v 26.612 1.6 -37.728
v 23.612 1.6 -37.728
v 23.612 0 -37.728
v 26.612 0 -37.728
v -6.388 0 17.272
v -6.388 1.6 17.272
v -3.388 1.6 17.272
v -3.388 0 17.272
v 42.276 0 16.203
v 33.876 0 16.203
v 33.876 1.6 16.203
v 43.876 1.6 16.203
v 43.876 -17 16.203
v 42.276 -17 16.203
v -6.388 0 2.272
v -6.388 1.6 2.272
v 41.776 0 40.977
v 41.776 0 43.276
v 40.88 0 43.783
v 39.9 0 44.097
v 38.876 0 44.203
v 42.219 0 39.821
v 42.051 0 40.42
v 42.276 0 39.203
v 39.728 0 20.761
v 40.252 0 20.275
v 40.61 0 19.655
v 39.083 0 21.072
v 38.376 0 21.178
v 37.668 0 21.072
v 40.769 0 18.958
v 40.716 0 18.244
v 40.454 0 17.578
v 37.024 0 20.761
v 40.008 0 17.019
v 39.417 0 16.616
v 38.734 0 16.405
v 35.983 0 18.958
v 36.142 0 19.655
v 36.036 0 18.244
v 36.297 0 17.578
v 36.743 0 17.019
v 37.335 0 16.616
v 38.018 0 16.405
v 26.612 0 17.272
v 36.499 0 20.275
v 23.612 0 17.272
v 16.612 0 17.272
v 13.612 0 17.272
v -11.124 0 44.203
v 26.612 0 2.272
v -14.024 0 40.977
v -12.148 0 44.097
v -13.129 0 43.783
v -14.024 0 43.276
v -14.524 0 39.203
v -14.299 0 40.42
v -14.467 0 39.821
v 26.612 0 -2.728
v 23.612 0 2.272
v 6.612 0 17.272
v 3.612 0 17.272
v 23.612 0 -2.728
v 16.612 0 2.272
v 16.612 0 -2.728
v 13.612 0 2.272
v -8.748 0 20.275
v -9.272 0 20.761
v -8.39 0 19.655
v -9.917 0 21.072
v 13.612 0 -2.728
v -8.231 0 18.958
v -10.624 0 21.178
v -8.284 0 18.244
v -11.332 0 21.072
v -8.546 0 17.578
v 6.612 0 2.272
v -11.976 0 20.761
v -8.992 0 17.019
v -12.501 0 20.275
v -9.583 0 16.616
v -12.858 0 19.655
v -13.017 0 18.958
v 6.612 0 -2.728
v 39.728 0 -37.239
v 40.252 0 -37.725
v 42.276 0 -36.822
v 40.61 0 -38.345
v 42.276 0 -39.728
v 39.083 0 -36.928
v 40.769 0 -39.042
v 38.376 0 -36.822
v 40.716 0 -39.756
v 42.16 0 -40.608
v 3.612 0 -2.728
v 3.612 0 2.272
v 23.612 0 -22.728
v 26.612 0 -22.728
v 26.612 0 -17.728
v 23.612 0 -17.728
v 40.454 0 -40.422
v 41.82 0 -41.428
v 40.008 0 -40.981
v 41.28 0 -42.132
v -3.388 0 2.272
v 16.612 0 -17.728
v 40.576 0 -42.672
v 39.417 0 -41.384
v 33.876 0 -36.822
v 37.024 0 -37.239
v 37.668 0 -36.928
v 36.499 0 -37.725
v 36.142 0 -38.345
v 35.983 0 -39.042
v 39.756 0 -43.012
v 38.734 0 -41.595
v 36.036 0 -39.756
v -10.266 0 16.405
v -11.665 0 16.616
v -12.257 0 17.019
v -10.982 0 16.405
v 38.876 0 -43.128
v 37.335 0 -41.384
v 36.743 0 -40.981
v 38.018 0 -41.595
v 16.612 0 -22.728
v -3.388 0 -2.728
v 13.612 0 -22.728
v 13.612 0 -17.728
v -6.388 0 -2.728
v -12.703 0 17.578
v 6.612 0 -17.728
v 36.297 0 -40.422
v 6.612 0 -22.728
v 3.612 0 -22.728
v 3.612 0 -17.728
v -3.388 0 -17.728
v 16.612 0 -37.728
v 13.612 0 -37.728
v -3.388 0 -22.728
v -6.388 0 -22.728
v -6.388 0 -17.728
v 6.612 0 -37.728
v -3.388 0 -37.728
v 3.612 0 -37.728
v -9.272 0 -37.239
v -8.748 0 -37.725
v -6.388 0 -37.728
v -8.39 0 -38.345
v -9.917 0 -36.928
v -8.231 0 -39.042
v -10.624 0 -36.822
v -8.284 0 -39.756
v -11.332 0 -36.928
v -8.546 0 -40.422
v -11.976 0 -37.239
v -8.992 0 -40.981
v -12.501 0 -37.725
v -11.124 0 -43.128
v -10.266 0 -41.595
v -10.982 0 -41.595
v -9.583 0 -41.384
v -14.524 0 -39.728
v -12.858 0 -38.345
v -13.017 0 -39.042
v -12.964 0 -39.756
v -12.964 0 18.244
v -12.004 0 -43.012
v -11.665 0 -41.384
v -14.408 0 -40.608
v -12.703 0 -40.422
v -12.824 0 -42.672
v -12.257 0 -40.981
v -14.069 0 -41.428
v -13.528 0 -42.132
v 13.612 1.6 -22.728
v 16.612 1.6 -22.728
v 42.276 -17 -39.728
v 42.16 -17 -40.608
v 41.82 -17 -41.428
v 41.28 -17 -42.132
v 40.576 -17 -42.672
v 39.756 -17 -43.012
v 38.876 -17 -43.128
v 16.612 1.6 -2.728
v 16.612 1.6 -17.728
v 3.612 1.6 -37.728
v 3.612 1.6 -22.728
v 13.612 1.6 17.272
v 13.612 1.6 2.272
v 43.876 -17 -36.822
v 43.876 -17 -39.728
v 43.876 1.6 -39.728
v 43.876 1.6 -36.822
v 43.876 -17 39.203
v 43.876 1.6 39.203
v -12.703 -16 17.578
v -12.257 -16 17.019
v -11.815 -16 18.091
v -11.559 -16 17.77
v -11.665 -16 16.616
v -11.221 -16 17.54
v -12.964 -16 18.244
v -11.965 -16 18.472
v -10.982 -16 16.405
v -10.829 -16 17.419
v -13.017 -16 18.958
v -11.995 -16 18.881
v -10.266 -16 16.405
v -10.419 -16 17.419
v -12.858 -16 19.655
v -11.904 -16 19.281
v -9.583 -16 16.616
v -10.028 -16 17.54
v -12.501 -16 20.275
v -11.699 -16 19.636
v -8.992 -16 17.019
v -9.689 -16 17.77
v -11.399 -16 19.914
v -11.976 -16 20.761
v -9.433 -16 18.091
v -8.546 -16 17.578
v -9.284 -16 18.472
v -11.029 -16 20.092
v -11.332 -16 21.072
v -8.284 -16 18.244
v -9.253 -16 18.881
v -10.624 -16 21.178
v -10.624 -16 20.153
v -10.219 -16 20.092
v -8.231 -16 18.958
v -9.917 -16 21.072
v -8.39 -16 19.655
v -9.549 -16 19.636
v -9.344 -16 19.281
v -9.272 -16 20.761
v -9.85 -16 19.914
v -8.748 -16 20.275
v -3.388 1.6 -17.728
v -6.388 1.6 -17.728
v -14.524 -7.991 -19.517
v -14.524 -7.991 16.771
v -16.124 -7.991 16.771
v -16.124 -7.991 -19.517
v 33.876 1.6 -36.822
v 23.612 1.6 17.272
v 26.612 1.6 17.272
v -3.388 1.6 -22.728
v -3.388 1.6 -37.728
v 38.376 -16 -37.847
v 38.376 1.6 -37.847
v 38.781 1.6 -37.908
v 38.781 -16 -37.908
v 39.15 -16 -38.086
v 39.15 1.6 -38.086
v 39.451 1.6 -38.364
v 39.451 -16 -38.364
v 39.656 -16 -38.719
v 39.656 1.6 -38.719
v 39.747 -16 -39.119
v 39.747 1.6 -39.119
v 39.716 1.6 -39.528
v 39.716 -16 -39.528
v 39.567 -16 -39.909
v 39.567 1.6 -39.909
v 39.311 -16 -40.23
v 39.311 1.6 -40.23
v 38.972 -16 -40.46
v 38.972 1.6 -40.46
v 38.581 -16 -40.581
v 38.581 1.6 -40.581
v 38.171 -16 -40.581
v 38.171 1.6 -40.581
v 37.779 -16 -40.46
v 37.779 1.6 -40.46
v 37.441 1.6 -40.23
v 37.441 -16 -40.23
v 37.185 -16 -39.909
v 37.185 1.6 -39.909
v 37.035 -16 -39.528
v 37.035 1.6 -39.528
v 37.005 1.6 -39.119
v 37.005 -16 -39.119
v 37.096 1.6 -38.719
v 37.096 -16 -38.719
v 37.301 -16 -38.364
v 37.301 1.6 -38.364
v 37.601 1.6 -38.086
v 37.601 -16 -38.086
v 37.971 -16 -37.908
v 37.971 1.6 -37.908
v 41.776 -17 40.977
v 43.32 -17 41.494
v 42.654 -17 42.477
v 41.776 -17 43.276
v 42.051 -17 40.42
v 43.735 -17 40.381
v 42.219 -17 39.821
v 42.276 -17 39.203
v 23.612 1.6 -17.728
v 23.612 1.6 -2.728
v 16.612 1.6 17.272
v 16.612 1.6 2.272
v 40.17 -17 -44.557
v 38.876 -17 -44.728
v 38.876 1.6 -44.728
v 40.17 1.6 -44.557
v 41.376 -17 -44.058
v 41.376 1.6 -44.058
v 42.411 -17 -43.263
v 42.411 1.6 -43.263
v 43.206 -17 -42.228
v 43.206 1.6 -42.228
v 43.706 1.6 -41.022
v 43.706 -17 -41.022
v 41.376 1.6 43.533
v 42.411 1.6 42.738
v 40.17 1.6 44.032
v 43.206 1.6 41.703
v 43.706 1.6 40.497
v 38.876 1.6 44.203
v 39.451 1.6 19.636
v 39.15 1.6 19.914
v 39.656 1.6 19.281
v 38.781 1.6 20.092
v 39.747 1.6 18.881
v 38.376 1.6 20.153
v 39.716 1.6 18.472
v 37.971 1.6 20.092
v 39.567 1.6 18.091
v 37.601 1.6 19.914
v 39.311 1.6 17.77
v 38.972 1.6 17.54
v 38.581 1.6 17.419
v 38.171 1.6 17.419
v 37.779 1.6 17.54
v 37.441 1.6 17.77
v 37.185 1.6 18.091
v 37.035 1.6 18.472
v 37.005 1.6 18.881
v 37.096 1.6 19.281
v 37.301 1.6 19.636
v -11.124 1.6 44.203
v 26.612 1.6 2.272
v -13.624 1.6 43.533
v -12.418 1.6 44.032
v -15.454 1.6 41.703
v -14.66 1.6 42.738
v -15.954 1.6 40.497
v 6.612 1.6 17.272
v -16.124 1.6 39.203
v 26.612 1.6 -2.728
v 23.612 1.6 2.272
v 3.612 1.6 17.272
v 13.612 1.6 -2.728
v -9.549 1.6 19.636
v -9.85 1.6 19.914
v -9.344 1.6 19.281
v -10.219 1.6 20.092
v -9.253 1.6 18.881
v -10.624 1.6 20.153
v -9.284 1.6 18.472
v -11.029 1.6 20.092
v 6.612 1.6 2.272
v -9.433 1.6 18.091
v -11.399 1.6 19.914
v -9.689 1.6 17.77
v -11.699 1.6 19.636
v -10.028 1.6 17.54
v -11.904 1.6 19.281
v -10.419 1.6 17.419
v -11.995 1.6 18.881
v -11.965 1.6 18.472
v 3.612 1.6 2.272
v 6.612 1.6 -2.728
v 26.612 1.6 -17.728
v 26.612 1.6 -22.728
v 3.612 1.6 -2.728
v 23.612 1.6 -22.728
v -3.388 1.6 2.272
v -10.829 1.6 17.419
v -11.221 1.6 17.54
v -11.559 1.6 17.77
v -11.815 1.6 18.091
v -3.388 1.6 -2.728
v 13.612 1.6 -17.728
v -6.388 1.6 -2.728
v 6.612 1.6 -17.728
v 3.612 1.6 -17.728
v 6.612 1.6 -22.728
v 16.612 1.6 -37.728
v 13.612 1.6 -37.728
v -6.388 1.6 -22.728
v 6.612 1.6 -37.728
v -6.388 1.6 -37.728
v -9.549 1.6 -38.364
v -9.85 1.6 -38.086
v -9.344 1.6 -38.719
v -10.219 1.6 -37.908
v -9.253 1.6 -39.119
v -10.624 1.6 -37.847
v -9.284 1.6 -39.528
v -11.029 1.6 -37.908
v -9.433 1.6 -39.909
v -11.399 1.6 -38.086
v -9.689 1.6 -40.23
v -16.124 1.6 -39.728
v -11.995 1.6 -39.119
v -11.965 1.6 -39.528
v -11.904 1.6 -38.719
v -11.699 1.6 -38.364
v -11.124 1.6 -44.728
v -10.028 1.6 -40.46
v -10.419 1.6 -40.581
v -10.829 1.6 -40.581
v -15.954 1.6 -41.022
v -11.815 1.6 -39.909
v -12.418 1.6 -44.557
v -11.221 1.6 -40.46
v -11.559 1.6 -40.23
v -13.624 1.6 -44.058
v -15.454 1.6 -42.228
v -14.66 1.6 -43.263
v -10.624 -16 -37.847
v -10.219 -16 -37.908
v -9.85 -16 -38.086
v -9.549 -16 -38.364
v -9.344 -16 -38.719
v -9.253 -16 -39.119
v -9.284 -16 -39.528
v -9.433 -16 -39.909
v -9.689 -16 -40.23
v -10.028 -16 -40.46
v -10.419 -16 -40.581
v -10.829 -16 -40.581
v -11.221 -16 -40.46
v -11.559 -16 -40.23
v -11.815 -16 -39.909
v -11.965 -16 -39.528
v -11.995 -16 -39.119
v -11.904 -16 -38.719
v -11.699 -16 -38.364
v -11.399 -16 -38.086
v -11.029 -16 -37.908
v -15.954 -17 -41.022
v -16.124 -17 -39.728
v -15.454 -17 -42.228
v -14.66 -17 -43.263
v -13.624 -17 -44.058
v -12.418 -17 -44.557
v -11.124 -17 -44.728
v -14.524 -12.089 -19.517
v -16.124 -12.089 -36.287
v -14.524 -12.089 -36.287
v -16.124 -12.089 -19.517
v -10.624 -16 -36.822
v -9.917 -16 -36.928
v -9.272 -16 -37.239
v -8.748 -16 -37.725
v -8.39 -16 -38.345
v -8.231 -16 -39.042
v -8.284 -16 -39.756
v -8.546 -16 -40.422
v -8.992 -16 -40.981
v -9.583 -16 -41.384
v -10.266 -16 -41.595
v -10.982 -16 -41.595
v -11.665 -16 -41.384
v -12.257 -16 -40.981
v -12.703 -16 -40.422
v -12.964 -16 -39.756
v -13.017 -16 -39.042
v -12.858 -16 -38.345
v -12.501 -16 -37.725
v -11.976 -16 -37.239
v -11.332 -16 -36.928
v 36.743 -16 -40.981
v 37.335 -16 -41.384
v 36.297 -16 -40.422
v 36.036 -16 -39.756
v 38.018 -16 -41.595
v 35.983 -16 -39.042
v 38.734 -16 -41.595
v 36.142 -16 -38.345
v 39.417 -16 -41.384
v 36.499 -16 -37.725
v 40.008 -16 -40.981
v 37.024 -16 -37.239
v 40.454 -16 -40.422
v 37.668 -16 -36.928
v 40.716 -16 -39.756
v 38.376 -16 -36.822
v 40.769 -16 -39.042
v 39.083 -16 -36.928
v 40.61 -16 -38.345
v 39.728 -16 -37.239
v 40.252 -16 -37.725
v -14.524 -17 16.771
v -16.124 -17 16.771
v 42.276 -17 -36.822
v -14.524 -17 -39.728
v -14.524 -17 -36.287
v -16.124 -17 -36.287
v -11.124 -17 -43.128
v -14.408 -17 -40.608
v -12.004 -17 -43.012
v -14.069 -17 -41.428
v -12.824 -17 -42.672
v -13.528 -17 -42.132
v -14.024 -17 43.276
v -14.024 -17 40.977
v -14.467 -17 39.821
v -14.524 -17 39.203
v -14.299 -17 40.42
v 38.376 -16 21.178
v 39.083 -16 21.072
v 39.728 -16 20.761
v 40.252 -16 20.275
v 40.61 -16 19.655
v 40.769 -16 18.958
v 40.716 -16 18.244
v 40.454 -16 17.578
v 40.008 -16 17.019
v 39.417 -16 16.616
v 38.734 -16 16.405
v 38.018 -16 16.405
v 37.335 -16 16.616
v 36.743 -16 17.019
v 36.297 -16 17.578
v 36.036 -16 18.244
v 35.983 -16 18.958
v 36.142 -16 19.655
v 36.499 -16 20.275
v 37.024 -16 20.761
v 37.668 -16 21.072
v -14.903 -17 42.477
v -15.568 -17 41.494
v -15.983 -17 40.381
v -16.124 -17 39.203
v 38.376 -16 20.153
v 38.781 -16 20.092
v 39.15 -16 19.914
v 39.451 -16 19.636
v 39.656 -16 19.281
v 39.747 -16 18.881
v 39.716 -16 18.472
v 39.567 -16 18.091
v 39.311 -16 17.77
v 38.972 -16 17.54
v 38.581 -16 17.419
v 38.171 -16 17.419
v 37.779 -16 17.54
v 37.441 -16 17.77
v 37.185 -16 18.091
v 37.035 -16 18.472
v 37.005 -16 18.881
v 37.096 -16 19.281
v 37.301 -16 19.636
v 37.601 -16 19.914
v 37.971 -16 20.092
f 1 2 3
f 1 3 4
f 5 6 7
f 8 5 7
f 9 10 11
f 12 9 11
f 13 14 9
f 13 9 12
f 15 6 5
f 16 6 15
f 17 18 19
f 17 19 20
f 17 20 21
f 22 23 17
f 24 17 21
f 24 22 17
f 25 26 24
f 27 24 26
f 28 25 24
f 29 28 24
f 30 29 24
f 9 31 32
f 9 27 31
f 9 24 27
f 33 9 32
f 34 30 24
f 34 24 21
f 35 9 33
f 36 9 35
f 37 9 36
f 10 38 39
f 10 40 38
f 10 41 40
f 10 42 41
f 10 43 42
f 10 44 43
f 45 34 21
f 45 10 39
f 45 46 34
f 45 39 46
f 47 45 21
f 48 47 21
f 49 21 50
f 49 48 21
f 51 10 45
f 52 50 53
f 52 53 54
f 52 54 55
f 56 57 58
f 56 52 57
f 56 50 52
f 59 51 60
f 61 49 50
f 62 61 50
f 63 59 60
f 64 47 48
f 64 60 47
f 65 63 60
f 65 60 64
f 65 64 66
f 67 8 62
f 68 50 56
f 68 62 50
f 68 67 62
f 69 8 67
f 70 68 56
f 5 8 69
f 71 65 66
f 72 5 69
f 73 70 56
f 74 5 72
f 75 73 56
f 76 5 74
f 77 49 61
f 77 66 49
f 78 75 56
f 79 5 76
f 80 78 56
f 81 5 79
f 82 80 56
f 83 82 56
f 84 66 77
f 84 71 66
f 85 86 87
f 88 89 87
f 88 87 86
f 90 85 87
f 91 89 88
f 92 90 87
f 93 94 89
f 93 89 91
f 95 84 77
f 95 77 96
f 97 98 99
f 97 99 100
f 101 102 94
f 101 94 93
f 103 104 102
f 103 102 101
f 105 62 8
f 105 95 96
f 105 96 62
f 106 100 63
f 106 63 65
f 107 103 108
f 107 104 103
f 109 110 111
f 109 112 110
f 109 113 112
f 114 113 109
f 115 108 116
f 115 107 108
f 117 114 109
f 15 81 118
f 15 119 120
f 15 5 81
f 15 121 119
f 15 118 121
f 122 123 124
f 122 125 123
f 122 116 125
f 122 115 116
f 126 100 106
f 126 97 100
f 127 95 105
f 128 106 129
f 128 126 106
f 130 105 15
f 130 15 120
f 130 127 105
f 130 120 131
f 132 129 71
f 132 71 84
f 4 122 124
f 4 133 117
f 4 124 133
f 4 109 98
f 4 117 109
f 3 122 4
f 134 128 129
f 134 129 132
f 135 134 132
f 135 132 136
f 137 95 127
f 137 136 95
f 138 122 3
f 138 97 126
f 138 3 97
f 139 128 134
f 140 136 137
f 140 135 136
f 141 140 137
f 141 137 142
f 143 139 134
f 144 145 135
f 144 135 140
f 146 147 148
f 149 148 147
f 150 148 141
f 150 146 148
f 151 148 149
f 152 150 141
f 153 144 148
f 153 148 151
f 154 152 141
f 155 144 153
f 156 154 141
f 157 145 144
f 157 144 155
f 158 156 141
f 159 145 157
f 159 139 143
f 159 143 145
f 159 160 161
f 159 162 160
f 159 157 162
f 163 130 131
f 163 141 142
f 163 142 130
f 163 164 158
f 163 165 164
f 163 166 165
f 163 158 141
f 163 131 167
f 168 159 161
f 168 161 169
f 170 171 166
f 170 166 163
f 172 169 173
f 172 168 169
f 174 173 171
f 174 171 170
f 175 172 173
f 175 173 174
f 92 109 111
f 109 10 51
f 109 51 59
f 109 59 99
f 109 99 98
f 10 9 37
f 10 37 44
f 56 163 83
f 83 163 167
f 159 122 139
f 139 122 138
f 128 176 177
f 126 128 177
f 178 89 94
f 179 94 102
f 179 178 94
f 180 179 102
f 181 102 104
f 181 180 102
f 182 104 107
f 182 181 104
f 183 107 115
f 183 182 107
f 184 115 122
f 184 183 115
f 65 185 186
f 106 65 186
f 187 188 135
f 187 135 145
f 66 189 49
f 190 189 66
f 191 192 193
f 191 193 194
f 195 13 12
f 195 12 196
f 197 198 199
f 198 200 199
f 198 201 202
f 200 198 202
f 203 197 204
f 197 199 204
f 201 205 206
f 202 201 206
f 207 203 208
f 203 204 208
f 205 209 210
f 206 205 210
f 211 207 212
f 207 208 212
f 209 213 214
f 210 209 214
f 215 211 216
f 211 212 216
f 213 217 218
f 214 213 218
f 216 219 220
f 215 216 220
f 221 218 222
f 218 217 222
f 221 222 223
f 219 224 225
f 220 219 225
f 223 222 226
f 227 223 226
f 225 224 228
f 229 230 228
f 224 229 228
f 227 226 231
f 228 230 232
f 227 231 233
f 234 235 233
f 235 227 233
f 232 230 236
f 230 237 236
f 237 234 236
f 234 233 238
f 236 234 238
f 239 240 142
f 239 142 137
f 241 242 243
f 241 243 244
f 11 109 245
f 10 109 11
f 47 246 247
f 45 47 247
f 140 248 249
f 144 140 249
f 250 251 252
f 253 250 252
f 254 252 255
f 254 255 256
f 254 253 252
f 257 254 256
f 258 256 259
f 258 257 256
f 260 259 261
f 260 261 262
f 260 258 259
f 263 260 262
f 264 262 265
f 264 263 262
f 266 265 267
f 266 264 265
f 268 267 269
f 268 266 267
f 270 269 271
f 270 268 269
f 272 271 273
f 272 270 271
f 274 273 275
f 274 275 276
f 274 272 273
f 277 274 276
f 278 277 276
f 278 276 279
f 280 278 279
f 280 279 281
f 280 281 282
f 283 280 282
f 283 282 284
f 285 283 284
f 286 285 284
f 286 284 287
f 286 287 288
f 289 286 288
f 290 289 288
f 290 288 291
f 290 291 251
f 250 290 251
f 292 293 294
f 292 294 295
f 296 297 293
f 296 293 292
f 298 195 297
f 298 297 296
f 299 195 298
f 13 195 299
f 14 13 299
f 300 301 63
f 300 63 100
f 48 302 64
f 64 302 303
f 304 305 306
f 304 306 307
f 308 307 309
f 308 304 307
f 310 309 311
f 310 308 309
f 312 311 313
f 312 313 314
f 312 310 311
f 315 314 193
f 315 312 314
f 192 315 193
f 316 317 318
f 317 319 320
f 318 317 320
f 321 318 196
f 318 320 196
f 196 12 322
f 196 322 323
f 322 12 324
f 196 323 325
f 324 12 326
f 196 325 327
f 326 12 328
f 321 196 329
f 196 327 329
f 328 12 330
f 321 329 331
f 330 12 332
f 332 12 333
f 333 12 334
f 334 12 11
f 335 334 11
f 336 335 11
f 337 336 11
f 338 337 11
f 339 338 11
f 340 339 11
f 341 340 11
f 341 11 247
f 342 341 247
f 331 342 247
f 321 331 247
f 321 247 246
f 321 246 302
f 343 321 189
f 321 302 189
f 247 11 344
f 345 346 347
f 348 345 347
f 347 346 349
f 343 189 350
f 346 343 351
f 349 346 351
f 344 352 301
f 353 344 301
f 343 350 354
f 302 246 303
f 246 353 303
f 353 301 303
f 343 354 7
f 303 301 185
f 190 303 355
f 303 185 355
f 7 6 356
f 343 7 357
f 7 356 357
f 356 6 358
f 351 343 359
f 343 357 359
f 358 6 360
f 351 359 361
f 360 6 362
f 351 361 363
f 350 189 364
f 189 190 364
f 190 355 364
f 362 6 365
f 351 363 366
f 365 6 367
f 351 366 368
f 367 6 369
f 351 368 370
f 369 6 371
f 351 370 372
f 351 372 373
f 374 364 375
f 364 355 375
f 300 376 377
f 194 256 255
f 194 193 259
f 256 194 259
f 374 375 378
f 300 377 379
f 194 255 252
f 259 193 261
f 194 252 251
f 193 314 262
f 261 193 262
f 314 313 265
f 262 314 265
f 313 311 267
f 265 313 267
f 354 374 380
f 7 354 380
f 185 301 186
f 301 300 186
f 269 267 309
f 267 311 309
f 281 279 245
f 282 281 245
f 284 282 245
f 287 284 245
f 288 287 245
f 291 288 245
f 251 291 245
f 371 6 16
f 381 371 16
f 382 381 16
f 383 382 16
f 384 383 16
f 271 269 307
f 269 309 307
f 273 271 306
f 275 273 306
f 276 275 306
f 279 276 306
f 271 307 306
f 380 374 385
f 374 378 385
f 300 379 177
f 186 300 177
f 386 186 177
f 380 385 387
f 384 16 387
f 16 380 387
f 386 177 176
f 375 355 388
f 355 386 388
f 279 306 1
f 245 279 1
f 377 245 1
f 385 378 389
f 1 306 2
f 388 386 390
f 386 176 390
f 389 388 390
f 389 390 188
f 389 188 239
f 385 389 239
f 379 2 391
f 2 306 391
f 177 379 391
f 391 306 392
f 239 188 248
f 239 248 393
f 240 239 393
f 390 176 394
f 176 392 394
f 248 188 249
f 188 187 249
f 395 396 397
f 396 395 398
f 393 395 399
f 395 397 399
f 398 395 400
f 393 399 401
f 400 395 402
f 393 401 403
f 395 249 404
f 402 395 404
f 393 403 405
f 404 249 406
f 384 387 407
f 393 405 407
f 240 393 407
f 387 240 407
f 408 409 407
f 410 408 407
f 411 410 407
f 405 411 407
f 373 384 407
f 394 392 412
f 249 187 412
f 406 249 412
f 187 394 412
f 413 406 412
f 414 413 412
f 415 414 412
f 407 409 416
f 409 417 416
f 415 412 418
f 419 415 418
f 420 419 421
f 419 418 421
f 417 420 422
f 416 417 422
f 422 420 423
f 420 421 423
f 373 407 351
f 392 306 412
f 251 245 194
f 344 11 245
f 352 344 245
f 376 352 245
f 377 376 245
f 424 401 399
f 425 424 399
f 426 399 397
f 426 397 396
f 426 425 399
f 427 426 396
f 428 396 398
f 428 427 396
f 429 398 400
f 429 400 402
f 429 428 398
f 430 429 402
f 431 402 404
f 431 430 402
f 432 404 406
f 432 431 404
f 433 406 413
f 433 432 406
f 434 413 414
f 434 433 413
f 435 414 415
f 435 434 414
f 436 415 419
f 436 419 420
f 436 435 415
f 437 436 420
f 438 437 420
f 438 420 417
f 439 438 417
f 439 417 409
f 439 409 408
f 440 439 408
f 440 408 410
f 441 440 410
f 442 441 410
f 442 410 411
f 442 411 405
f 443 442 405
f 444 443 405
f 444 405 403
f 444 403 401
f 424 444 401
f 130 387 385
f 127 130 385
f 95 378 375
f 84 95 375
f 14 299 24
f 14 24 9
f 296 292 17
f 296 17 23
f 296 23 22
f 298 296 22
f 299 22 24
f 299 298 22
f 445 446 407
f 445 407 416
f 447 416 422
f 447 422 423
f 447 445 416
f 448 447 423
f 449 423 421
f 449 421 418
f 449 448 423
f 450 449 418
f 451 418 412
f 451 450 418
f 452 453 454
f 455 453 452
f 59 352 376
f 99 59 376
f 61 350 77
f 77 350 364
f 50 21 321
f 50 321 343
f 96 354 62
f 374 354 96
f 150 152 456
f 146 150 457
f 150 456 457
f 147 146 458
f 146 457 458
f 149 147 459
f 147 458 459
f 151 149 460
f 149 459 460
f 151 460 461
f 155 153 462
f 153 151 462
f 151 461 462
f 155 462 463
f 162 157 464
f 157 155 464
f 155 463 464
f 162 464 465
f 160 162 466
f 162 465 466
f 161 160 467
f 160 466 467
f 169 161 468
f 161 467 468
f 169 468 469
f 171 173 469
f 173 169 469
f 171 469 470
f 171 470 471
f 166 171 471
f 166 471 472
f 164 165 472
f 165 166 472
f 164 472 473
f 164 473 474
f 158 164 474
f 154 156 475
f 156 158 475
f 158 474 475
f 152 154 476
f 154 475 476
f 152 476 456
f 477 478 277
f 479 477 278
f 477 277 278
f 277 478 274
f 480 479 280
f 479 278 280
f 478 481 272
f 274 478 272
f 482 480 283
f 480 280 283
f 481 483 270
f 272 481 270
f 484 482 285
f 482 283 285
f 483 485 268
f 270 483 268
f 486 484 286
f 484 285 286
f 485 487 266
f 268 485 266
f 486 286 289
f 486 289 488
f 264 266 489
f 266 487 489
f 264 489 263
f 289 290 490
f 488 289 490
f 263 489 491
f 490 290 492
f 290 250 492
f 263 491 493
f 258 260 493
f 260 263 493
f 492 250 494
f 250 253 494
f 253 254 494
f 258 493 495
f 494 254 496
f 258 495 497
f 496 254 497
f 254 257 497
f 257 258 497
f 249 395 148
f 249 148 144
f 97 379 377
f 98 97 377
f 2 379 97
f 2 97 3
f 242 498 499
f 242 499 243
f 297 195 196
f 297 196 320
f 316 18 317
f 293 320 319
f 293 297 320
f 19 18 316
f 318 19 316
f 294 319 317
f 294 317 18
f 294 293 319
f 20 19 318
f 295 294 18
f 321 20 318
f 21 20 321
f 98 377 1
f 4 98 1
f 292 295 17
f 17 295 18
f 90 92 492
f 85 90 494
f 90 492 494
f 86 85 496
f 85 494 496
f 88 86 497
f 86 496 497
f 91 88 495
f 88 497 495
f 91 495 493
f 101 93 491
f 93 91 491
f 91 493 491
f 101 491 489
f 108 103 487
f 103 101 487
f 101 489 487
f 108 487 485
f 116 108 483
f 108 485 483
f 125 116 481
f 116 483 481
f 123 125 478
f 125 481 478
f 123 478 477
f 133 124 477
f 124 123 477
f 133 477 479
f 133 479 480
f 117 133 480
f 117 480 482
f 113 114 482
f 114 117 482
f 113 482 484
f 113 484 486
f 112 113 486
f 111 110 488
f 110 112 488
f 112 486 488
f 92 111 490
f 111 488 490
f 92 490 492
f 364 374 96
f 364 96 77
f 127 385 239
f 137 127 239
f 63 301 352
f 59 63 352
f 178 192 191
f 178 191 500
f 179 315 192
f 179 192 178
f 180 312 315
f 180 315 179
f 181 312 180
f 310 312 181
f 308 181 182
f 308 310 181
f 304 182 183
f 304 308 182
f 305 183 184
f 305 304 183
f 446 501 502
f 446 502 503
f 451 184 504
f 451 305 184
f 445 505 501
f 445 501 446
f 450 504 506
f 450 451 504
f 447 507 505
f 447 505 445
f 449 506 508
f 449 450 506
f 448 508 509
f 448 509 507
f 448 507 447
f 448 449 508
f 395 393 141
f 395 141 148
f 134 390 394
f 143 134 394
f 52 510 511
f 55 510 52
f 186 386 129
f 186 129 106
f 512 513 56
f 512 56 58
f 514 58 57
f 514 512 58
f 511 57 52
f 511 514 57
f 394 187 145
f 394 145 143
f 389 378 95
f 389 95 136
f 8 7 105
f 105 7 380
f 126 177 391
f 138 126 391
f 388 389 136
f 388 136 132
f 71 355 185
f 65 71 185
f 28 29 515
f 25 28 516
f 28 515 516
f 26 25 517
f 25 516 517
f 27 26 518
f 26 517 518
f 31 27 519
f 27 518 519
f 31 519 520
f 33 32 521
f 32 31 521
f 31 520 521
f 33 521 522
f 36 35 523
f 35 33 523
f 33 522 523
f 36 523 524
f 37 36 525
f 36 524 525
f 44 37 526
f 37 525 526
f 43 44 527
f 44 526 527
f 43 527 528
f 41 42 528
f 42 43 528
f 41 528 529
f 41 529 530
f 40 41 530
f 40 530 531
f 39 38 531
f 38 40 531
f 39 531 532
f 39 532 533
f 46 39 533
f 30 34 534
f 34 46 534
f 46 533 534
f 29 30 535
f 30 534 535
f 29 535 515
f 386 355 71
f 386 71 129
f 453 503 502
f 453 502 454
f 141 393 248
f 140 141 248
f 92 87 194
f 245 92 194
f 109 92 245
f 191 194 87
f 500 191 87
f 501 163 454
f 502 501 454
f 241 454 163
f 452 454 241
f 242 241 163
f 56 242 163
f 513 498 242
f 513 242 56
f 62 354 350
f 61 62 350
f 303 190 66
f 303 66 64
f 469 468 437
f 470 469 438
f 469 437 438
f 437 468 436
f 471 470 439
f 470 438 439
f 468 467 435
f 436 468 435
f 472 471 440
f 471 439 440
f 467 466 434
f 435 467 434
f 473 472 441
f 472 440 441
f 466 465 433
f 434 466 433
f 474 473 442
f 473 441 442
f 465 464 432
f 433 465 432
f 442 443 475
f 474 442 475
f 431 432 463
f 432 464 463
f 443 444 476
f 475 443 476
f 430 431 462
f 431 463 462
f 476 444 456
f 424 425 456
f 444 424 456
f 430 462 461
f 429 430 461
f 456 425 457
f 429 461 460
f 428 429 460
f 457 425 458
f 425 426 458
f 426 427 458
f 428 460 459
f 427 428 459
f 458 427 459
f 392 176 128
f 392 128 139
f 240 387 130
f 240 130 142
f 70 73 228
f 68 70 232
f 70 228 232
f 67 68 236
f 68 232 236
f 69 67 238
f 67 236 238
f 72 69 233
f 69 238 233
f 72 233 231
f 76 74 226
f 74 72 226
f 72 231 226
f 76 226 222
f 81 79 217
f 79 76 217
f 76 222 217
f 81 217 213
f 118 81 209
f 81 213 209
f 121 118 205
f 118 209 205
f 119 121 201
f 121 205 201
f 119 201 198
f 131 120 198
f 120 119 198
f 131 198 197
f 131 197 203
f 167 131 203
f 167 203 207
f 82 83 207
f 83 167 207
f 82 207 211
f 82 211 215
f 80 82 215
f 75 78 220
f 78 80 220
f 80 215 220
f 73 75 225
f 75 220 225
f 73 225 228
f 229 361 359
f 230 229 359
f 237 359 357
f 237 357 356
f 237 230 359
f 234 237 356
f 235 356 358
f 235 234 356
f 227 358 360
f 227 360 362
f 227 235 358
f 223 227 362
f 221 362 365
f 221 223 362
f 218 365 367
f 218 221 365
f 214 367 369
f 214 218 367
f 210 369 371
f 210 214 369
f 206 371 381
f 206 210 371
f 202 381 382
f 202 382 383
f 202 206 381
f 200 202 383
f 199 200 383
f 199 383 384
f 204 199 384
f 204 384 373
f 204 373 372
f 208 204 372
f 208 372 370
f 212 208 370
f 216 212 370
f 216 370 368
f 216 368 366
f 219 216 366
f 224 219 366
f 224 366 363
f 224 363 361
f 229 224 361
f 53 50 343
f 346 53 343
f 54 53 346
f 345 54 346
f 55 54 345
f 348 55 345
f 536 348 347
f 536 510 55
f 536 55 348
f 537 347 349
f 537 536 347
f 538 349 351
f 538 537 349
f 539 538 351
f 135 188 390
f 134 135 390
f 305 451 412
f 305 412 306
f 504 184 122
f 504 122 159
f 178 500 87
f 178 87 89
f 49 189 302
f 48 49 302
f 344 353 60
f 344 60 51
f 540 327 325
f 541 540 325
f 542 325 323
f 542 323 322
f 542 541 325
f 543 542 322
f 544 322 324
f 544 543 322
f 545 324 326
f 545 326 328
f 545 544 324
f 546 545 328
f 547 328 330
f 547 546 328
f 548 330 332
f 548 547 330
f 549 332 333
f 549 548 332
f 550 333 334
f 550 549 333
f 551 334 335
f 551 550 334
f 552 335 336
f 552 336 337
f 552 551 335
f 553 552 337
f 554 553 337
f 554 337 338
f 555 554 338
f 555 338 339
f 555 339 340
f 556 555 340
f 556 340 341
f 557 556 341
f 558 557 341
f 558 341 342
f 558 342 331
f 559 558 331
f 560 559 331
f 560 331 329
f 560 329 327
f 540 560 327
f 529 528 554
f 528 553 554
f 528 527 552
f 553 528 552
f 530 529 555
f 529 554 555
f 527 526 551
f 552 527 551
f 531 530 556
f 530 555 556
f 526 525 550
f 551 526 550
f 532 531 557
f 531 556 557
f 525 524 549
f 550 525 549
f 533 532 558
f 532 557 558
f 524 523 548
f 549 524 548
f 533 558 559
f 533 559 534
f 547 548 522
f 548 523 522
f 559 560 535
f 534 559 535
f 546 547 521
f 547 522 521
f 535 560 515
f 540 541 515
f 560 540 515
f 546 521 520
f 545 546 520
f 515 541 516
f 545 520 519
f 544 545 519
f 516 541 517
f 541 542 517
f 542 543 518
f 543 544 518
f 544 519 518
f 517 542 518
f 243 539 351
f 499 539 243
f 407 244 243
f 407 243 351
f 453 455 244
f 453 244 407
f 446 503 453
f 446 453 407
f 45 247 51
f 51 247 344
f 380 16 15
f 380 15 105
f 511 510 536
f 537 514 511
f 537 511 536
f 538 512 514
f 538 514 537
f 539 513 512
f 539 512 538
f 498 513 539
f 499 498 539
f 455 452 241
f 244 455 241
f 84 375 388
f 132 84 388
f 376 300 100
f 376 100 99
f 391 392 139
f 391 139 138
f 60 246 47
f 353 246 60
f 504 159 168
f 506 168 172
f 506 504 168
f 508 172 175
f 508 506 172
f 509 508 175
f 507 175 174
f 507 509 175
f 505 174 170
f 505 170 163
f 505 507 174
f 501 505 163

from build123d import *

# Parameters (mm, degrees)
SKETCH1_R           = 1.375
BOSS_EXTRUDE1_DEPTH = 1.6
BOSS_EXTRUDE2_START = -17
BOSS_EXTRUDE2_DEPTH = 17
BOSS_EXTRUDE3_START = -17.6
SKETCH2_R           = 2.4
SKETCH2_R_2         = 1.375
BOSS_EXTRUDE3_DEPTH = 17.6
SKETCH3_W           = 36.288172123
SKETCH3_H           = 9.00941151
CUT_EXTRUDE1_DEPTH  = 10
SKETCH5_W           = 16.770268593
SKETCH5_H           = 4.911067329
CUT_EXTRUDE2_DEPTH  = 10
SKETCH7_W           = 55
SKETCH7_H           = 17
CUT_EXTRUDE3_DEPTH  = 10
SKETCH9_W           = 3
SKETCH9_H           = 15
CUT_EXTRUDE4_DEPTH  = 10
MOVE_FACE1_BY       = 0.4
MOVE_FACE1_2_BY     = 0.4
MOVE_FACE1_3_BY     = 0.4
MOVE_FACE1_4_BY     = 0.4
MOVE_FACE1_5_BY     = 0.4
MOVE_FACE1_6_BY     = 0.4
MOVE_FACE1_7_BY     = 0.4
MOVE_FACE1_8_BY     = 0.4
MOVE_FACE1_9_BY     = 0.4
MOVE_FACE1_10_BY    = 0.4


with BuildPart() as part:
    # Sketch1 → Boss-Extrude1 (new body)
    # profile 1 of 2: a face of its own
    with BuildSketch(Plane(origin=(0, 0, 0), x_dir=(1, 0, 0), z_dir=(0, 1, 0))):
        with BuildLine():
            Line((-11.124120265, 42.72781091), (38.875879735, 42.72781091))
            ThreePointArc((38.875879735, 42.72781091), (40.997200079, 41.849131254), (41.875879735, 39.72781091))
            Line((41.875879735, 39.72781091), (41.875879735, 36.821646567))
            Line((41.875879735, 36.821646567), (33.875879735, 36.821646567))
            Line((33.875879735, 36.821646567), (33.875879735, -16.202520779))
            Line((33.875879735, -16.202520779), (41.875879735, -16.202520779))
            Line((41.875879735, -16.202520779), (41.875879735, -39.202520779))
            ThreePointArc((41.875879735, -39.202520779), (40.997200079, -41.323841123), (38.875879735, -42.202520779))
            Line((38.875879735, -42.202520779), (-11.124120265, -42.202520779))
            ThreePointArc((-11.124120265, -42.202520779), (-13.245440608, -41.323841123), (-14.124120265, -39.202520779))
            Line((-14.124120265, -39.202520779), (-14.124120265, 39.72781091))
            ThreePointArc((-14.124120265, 39.72781091), (-13.245440608, 41.849131254), (-11.124120265, 42.72781091))
        make_face()
        with Locations(Location((-10.624120265, -18.778353433, 0), (0, 0, 270))):
            Circle(SKETCH1_R, mode=Mode.SUBTRACT)
        with Locations(Location((-10.624120265, 39.221646567, 0), (0, 0, 270))):
            Circle(SKETCH1_R, mode=Mode.SUBTRACT)
        with Locations(Location((38.375879735, 39.221646567, 0), (0, 0, 270))):
            Circle(SKETCH1_R, mode=Mode.SUBTRACT)
        with Locations(Location((38.375879735, -18.778353433, 0), (0, 0, 270))):
            Circle(SKETCH1_R, mode=Mode.SUBTRACT)
    # profile 2 of 2: a face of its own
    with BuildSketch(Plane(origin=(0, 0, 0), x_dir=(1, 0, 0), z_dir=(0, 1, 0))):
        with BuildLine():
            Line((-16.124120265, -39.202520779), (-16.124120265, 39.72781091))
            ThreePointArc((-16.124120265, 39.72781091), (-14.65965417, 43.263344816), (-11.124120265, 44.72781091))
            Line((-11.124120265, 44.72781091), (38.875879735, 44.72781091))
            ThreePointArc((38.875879735, 44.72781091), (42.411413641, 43.263344816), (43.875879735, 39.72781091))
            Line((43.875879735, 39.72781091), (43.875879735, 36.821646567))
            Line((43.875879735, 36.821646567), (41.875879735, 36.821646567))
            Line((41.875879735, 36.821646567), (41.875879735, 39.72781091))
            ThreePointArc((41.875879735, 39.72781091), (40.997200079, 41.849131254), (38.875879735, 42.72781091))
            Line((38.875879735, 42.72781091), (-11.124120265, 42.72781091))
            ThreePointArc((-11.124120265, 42.72781091), (-13.245440608, 41.849131254), (-14.124120265, 39.72781091))
            Line((-14.124120265, 39.72781091), (-14.124120265, -39.202520779))
            ThreePointArc((-14.124120265, -39.202520779), (-13.245440608, -41.323841123), (-11.124120265, -42.202520779))
            Line((-11.124120265, -42.202520779), (38.875879735, -42.202520779))
            ThreePointArc((38.875879735, -42.202520779), (40.997200079, -41.323841123), (41.875879735, -39.202520779))
            Line((41.875879735, -39.202520779), (41.875879735, -16.202520779))
            Line((41.875879735, -16.202520779), (43.875879735, -16.202520779))
            Line((43.875879735, -16.202520779), (43.875879735, -39.202520779))
            ThreePointArc((43.875879735, -39.202520779), (42.411413641, -42.738054685), (38.875879735, -44.202520779))
            Line((38.875879735, -44.202520779), (-11.124120265, -44.202520779))
            ThreePointArc((-11.124120265, -44.202520779), (-14.65965417, -42.738054685), (-16.124120265, -39.202520779))
        make_face()
    extrude(amount=BOSS_EXTRUDE1_DEPTH)

    # Sketch1<3> → Boss-Extrude2 (add)
    with BuildSketch(Plane(origin=(0, 0, 0), x_dir=(1, 0, 0), z_dir=(0, 1, 0)).offset(BOSS_EXTRUDE2_START)):
        with BuildLine():
            Line((-16.124120265, -39.202520779), (-16.124120265, 39.72781091))
            ThreePointArc((-16.124120265, 39.72781091), (-14.65965417, 43.263344816), (-11.124120265, 44.72781091))
            Line((-11.124120265, 44.72781091), (38.875879735, 44.72781091))
            ThreePointArc((38.875879735, 44.72781091), (42.411413641, 43.263344816), (43.875879735, 39.72781091))
            Line((43.875879735, 39.72781091), (43.875879735, 36.821646567))
            Line((43.875879735, 36.821646567), (41.875879735, 36.821646567))
            Line((41.875879735, 36.821646567), (41.875879735, 39.72781091))
            ThreePointArc((41.875879735, 39.72781091), (40.997200079, 41.849131254), (38.875879735, 42.72781091))
            Line((38.875879735, 42.72781091), (-11.124120265, 42.72781091))
            ThreePointArc((-11.124120265, 42.72781091), (-13.245440608, 41.849131254), (-14.124120265, 39.72781091))
            Line((-14.124120265, 39.72781091), (-14.124120265, -39.202520779))
            ThreePointArc((-14.124120265, -39.202520779), (-13.245440608, -41.323841123), (-11.124120265, -42.202520779))
            Line((-11.124120265, -42.202520779), (38.875879735, -42.202520779))
            ThreePointArc((38.875879735, -42.202520779), (40.997200079, -41.323841123), (41.875879735, -39.202520779))
            Line((41.875879735, -39.202520779), (41.875879735, -16.202520779))
            Line((41.875879735, -16.202520779), (43.875879735, -16.202520779))
            Line((43.875879735, -16.202520779), (43.875879735, -39.202520779))
            ThreePointArc((43.875879735, -39.202520779), (42.411413641, -42.738054685), (38.875879735, -44.202520779))
            Line((38.875879735, -44.202520779), (-11.124120265, -44.202520779))
            ThreePointArc((-11.124120265, -44.202520779), (-14.65965417, -42.738054685), (-16.124120265, -39.202520779))
        make_face()
    extrude(amount=BOSS_EXTRUDE2_DEPTH)

    # Sketch2 → Boss-Extrude3 (add)
    # profile 1 of 4: a face of its own
    with BuildSketch(Plane(origin=(0, 1.6, 0), x_dir=(1, 0, 0), z_dir=(0, 1, 0)).offset(BOSS_EXTRUDE3_START)):
        with Locations(Location((38.375879735, 39.221646567, 0), (0, 0, 270))):
            Circle(SKETCH2_R)
        with Locations(Location((38.375879735, 39.221646567, 0), (0, 0, 270))):
            Circle(SKETCH2_R_2, mode=Mode.SUBTRACT)
    # profile 2 of 4: a face of its own
    with BuildSketch(Plane(origin=(0, 1.6, 0), x_dir=(1, 0, 0), z_dir=(0, 1, 0)).offset(BOSS_EXTRUDE3_START)):
        with Locations(Location((38.375879735, -18.778353433, 0), (0, 0, 270))):
            Circle(SKETCH2_R)
        with Locations(Location((38.375879735, -18.778353433, 0), (0, 0, 270))):
            Circle(SKETCH2_R_2, mode=Mode.SUBTRACT)
    # profile 3 of 4: a face of its own
    with BuildSketch(Plane(origin=(0, 1.6, 0), x_dir=(1, 0, 0), z_dir=(0, 1, 0)).offset(BOSS_EXTRUDE3_START)):
        with Locations(Location((-10.624120265, -18.778353433, 0), (0, 0, 270))):
            Circle(SKETCH2_R)
        with Locations(Location((-10.624120265, -18.778353433, 0), (0, 0, 270))):
            Circle(SKETCH2_R_2, mode=Mode.SUBTRACT)
    # profile 4 of 4: a face of its own
    with BuildSketch(Plane(origin=(0, 1.6, 0), x_dir=(1, 0, 0), z_dir=(0, 1, 0)).offset(BOSS_EXTRUDE3_START)):
        with Locations(Location((-10.624120265, 39.221646567, 0), (0, 0, 270))):
            Circle(SKETCH2_R)
        with Locations(Location((-10.624120265, 39.221646567, 0), (0, 0, 270))):
            Circle(SKETCH2_R_2, mode=Mode.SUBTRACT)
    extrude(amount=BOSS_EXTRUDE3_DEPTH)

    # Sketch3 → Cut-Extrude1 (cut)
    with BuildSketch(Plane(origin=(-14.124120265, 0, 0), x_dir=(0, 0, -1), z_dir=(1, 0, 0))):
        with Locations((1.373104953, -12.495294245)):
            Rectangle(SKETCH3_W, SKETCH3_H)
    extrude(amount=-CUT_EXTRUDE1_DEPTH, mode=Mode.SUBTRACT)

    # Sketch5 → Cut-Extrude2 (cut)
    with BuildSketch(Plane.ZY.offset(16.124120265)):
        with Locations((-27.902325311, -14.544466336)):
            Rectangle(SKETCH5_W, SKETCH5_H)
    extrude(amount=-CUT_EXTRUDE2_DEPTH, mode=Mode.SUBTRACT)

    # Sketch7 → Cut-Extrude3 (cut)
    with BuildSketch(Plane.XY.offset(44.202520779)):
        with Locations((13.875879735, -8.5)):
            Rectangle(SKETCH7_W, SKETCH7_H)
    extrude(amount=-CUT_EXTRUDE3_DEPTH, mode=Mode.SUBTRACT)

    # Sketch9 → Cut-Extrude4 (cut)
    with BuildSketch(Plane(origin=(0, 1.6, 0), x_dir=(1, 0, 0), z_dir=(0, 1, 0))):
        with Locations((-4.888394882, 30.22781091)):
            Rectangle(SKETCH9_W, SKETCH9_H)
        with Locations((5.111605118, 30.22781091)):
            Rectangle(SKETCH9_W, SKETCH9_H)
        with Locations((15.111605118, 30.22781091)):
            Rectangle(SKETCH9_W, SKETCH9_H)
        with Locations((25.111605118, 30.22781091)):
            Rectangle(SKETCH9_W, SKETCH9_H)
        with Locations((5.111605118, 10.22781091)):
            Rectangle(SKETCH9_W, SKETCH9_H)
        with Locations((15.111605118, 10.22781091)):
            Rectangle(SKETCH9_W, SKETCH9_H)
        with Locations((25.111605118, 10.22781091)):
            Rectangle(SKETCH9_W, SKETCH9_H)
        with Locations((5.111605118, -9.77218909)):
            Rectangle(SKETCH9_W, SKETCH9_H)
        with Locations((15.111605118, -9.77218909)):
            Rectangle(SKETCH9_W, SKETCH9_H)
        with Locations((25.111605118, -9.77218909)):
            Rectangle(SKETCH9_W, SKETCH9_H)
        with Locations((-4.888394882, 10.22781091)):
            Rectangle(SKETCH9_W, SKETCH9_H)
        with Locations((-4.888394882, -9.77218909)):
            Rectangle(SKETCH9_W, SKETCH9_H)
    extrude(amount=-CUT_EXTRUDE4_DEPTH, mode=Mode.SUBTRACT)

    # Move Face1: a face moved inward by 0.4
    extrude(part.faces().sort_by_distance((41.375879735, -8.5, 42.196740487))[0], amount=MOVE_FACE1_BY, dir=(1, 0, 0), mode=Mode.SUBTRACT)

    # Move Face1 2: a curved face moved inward by 0.4
    add(Solid.thicken(part.faces().sort_by_distance((41.748161059, -8.5, 40.068546183))[0], -MOVE_FACE1_2_BY), mode=Mode.SUBTRACT)

    # Move Face1 3: a face moved inward by 0.4
    extrude(part.faces().sort_by_distance((41.875879735, -8.5, 27.702520779))[0], amount=MOVE_FACE1_3_BY, dir=(1, 0, 0), mode=Mode.SUBTRACT)

    # Move Face1 4: a face moved inward by 0.4
    extrude(part.faces().sort_by_distance((-13.624120265, -8.5, 42.196740487))[0], amount=MOVE_FACE1_4_BY, dir=(-1, 0, 0), mode=Mode.SUBTRACT)

    # Move Face1 5: a curved face moved inward by 0.4
    add(Solid.thicken(part.faces().sort_by_distance((-13.996401588, -8.5, 40.068546183))[0], -MOVE_FACE1_5_BY), mode=Mode.SUBTRACT)

    # Move Face1 6: a face moved inward by 0.4
    extrude(part.faces().sort_by_distance((-14.124120265, -6.565433094, 2.567801751))[0], amount=MOVE_FACE1_6_BY, dir=(-1, 0, 0), mode=Mode.SUBTRACT)

    # Move Face1 7: a curved face moved inward by 0.4
    add(Solid.thicken(part.faces().sort_by_distance((-13.245440608, -8.5, -41.849131254))[0], -MOVE_FACE1_7_BY), mode=Mode.SUBTRACT)

    # Move Face1 8: a face moved inward by 0.4
    extrude(part.faces().sort_by_distance((41.875879735, -8.5, -38.274728738))[0], amount=MOVE_FACE1_8_BY, dir=(1, 0, 0), mode=Mode.SUBTRACT)

    # Move Face1 9: a curved face moved inward by 0.4
    add(Solid.thicken(part.faces().sort_by_distance((40.997200079, -8.5, -41.849131254))[0], -MOVE_FACE1_9_BY), mode=Mode.SUBTRACT)

    # Move Face1 10: a face moved inward by 0.4
    extrude(part.faces().sort_by_distance((13.875879735, -8.5, -42.72781091))[0], amount=MOVE_FACE1_10_BY, dir=(0, 0, -1), mode=Mode.SUBTRACT)


solid = part.part
